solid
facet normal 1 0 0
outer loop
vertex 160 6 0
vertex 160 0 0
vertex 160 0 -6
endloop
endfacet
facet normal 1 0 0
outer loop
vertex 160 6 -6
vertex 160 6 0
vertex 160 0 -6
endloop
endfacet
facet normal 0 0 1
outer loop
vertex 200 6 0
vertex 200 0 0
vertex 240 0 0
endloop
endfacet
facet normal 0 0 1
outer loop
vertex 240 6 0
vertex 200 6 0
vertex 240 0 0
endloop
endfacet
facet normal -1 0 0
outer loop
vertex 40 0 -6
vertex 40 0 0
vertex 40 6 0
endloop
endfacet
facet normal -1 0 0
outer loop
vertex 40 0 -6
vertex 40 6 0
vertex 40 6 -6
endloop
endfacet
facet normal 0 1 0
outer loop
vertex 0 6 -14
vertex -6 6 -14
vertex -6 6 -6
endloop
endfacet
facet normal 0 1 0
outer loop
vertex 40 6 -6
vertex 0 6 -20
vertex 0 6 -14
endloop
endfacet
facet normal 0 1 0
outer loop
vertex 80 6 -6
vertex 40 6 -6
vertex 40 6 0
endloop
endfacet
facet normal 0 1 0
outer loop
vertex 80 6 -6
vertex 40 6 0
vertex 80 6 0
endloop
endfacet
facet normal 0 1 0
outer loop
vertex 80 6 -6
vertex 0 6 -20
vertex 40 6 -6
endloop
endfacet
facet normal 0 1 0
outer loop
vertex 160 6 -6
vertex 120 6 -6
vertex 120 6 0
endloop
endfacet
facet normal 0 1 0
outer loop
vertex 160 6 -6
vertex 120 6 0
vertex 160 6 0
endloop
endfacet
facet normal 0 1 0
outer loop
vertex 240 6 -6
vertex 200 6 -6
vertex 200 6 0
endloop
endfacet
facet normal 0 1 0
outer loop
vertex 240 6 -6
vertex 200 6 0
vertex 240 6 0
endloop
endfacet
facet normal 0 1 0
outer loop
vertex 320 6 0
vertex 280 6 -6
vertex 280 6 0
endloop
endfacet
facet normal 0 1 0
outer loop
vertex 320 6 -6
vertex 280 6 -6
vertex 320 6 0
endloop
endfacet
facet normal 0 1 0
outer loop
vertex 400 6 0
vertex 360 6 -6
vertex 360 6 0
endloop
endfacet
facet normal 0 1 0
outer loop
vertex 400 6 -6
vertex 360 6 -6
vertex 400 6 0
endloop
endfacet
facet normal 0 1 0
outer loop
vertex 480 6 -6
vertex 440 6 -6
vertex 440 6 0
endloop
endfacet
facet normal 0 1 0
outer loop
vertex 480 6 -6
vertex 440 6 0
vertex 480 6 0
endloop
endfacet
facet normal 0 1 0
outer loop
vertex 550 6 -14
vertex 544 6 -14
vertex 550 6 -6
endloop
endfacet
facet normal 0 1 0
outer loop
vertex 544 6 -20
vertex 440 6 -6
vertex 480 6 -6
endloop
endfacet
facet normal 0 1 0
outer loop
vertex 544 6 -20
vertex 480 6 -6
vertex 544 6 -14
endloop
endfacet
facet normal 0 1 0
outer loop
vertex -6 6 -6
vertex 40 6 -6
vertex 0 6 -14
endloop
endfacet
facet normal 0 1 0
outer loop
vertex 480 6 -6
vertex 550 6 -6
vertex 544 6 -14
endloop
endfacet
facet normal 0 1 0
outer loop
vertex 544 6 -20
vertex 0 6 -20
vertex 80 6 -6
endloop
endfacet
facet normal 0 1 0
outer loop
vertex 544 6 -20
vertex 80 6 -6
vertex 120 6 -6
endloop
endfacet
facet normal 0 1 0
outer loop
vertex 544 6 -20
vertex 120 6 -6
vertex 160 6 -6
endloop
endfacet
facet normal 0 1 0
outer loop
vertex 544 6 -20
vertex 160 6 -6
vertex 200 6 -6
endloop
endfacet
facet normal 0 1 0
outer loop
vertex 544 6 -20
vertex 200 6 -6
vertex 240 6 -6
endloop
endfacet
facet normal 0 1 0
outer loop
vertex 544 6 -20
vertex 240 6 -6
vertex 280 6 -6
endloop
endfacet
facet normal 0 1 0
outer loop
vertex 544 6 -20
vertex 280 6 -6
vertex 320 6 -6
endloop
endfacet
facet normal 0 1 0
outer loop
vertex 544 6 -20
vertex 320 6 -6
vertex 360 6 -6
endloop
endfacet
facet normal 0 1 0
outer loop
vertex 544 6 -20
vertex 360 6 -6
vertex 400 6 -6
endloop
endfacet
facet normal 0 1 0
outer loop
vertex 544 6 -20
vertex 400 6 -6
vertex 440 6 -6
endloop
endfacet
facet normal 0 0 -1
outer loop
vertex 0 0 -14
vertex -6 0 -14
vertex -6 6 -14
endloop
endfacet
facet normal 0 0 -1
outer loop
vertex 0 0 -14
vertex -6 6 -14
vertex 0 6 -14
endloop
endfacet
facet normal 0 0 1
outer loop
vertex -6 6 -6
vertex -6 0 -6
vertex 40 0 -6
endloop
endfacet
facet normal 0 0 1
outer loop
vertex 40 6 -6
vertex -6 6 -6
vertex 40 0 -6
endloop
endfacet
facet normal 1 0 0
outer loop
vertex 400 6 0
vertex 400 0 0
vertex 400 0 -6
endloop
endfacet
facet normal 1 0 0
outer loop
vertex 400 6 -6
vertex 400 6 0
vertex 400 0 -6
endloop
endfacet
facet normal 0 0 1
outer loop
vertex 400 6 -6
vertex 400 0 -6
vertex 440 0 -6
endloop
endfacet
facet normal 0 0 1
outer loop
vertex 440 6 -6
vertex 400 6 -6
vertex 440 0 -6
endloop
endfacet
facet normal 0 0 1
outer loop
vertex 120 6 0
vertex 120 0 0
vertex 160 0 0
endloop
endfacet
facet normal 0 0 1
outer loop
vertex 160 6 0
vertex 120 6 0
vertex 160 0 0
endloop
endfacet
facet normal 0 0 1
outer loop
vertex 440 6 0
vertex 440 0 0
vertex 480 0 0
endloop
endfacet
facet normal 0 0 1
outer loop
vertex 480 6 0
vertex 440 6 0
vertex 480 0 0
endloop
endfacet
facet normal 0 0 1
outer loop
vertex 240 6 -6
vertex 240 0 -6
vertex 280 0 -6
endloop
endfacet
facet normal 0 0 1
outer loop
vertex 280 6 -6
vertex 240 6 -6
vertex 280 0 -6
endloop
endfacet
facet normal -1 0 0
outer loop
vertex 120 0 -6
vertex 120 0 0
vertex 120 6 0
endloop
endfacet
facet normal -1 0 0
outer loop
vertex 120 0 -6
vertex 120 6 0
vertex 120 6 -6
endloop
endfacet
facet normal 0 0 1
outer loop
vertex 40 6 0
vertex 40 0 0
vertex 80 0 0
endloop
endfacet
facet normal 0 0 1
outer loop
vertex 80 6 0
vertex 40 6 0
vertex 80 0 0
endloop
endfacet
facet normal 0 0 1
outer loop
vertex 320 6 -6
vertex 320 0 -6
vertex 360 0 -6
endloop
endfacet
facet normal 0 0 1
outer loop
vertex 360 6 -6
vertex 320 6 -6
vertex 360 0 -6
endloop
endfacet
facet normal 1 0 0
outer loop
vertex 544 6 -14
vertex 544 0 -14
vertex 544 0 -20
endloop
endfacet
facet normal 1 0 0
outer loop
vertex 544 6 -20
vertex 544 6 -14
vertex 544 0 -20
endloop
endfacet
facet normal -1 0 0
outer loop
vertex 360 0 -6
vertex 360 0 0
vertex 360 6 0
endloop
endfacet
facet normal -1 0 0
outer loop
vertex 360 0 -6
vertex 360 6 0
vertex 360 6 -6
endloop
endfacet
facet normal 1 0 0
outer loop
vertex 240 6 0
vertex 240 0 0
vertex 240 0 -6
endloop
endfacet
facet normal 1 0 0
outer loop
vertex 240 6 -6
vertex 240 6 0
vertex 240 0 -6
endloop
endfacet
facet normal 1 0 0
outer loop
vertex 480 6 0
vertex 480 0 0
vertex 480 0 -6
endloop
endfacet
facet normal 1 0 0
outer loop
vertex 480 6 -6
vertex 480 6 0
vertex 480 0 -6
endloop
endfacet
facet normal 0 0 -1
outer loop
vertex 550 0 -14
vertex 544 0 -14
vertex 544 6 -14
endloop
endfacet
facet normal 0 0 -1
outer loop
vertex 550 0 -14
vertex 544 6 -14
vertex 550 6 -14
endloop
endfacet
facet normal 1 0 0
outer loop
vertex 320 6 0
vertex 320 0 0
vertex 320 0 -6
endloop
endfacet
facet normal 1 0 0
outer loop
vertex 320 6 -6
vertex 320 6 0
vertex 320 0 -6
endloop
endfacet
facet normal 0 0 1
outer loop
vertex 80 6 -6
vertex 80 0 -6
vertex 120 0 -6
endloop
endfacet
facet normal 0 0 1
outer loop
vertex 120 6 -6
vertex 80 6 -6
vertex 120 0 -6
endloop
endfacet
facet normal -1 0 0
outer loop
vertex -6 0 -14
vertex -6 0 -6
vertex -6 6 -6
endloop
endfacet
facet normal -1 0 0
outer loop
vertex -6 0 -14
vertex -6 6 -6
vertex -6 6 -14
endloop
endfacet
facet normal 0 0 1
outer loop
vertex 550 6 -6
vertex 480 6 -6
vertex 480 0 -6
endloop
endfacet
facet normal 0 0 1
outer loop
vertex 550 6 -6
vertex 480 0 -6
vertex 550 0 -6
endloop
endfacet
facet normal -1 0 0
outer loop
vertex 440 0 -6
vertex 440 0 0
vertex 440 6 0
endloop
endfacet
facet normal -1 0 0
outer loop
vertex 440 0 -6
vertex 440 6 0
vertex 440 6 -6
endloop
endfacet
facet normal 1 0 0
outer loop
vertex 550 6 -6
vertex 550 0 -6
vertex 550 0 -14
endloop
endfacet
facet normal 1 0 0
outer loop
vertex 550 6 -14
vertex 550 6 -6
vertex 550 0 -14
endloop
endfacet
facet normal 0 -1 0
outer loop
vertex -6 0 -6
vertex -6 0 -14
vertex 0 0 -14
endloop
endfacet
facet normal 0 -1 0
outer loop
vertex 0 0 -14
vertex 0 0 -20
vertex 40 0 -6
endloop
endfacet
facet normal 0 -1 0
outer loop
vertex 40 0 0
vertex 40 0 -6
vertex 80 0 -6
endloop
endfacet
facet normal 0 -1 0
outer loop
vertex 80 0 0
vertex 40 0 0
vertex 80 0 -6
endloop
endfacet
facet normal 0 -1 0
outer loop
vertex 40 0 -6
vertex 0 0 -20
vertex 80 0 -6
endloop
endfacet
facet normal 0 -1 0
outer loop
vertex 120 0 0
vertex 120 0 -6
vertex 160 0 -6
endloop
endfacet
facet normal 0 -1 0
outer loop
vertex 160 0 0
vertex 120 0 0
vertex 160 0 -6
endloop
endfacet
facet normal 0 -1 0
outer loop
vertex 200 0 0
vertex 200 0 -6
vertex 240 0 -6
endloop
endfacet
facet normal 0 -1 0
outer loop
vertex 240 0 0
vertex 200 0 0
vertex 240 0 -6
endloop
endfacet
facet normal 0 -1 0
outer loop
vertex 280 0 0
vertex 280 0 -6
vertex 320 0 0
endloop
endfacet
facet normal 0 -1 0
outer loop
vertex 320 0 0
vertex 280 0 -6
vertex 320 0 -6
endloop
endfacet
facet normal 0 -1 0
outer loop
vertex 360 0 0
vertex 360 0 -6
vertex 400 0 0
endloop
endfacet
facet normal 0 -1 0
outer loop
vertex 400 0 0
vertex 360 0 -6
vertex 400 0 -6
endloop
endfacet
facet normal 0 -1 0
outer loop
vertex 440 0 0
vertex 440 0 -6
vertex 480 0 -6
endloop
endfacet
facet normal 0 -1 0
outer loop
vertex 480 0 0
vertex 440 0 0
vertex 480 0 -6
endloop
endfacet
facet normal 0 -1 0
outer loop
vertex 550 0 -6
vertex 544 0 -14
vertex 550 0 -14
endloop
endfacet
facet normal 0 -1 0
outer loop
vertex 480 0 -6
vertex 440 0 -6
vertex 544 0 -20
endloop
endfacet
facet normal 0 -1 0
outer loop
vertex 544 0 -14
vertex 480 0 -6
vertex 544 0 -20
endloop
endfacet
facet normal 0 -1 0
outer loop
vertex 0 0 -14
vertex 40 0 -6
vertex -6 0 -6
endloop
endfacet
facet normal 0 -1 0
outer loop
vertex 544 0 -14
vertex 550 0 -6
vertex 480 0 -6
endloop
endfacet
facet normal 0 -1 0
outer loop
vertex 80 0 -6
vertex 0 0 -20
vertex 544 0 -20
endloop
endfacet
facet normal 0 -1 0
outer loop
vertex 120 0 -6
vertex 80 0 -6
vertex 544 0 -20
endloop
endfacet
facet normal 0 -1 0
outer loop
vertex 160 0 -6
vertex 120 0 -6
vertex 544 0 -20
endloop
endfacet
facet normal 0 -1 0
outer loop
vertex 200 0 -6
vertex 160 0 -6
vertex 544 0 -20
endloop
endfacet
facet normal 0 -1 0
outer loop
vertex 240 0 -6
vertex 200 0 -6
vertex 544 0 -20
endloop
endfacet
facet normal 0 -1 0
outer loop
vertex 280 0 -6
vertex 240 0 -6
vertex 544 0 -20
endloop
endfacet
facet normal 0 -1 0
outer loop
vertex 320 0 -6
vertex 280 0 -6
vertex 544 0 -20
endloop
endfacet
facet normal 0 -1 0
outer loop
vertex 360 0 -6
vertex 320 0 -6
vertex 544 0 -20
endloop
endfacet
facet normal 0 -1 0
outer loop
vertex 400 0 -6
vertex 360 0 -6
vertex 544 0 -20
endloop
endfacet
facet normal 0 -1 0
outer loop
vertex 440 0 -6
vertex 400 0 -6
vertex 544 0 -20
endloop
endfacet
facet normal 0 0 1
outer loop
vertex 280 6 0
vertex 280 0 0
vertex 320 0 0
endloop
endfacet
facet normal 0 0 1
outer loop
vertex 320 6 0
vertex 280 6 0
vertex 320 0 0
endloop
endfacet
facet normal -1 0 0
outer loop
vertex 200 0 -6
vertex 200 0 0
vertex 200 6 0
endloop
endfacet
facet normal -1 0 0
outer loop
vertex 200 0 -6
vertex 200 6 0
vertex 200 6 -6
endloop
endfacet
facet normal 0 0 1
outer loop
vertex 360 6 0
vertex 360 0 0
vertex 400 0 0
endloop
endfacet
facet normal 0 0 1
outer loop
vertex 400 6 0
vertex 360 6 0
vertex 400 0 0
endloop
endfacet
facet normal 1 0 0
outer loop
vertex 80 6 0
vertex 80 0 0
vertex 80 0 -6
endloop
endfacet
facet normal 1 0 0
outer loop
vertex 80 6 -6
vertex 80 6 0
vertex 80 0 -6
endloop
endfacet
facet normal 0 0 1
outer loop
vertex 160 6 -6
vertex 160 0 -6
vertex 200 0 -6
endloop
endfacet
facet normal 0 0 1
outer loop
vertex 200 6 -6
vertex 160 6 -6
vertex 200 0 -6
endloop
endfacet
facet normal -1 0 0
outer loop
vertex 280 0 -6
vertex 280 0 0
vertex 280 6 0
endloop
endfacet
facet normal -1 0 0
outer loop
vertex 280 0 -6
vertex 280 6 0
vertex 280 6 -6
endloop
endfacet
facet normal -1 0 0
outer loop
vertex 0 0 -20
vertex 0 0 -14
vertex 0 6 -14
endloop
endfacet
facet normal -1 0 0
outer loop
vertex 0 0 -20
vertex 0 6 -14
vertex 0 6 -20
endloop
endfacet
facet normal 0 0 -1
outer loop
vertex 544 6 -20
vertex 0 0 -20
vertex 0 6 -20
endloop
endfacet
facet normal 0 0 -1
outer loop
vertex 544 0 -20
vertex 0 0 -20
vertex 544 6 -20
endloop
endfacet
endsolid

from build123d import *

# Parameters (mm, degrees)
CROQUIS1_W              = 544
CROQUIS1_H              = 20
SALIENTE_EXTRUIR1_DEPTH = 6
CROQUIS3_W              = 40
CROQUIS3_H              = 6
CORTAR_EXTRUIR1_DEPTH   = 6
MATRIZL1_COUNT          = 7
MATRIZL1_PITCH          = 80
CROQUIS4_W              = 24
CROQUIS4_H              = 6
CORTAR_EXTRUIR2_DEPTH   = 6
CROQUIS5_W              = 6
CROQUIS5_H              = 8
SALIENTE_EXTRUIR3_DEPTH = 6


with BuildPart() as part:
    # Croquis1 → Saliente-Extruir1 (new body)
    with BuildSketch(Plane(origin=(0, 0, 0), x_dir=(1, 0, 0), z_dir=(0, 1, 0))):
        with Locations((272, 10)):
            Rectangle(CROQUIS1_W, CROQUIS1_H)
    extrude(amount=SALIENTE_EXTRUIR1_DEPTH)

    # Croquis3 → Cortar-Extruir1 (cut)
    with BuildSketch(Plane(origin=(0, 0, 0), x_dir=(1, 0, 0), z_dir=(0, 1, 0))):
        with Locations((20, 3)):
            Rectangle(CROQUIS3_W, CROQUIS3_H)
    cortar_extruir1 = extrude(amount=CORTAR_EXTRUIR1_DEPTH, mode=Mode.SUBTRACT)

    # MatrizL1: Cortar-Extruir1 ×7
    with Locations(*[(i * MATRIZL1_PITCH, 0, 0) for i in range(1, MATRIZL1_COUNT)]):
        add(cortar_extruir1, mode=Mode.SUBTRACT)

    # Croquis4 → Cortar-Extruir2 (cut)
    with BuildSketch(Plane(origin=(0, 6, 0), x_dir=(1, 0, 0), z_dir=(0, 1, 0))):
        with Locations((532, 3)):
            Rectangle(CROQUIS4_W, CROQUIS4_H)
    extrude(amount=-CORTAR_EXTRUIR2_DEPTH, mode=Mode.SUBTRACT)

    # Croquis5 → Saliente-Extruir3 (add)
    with BuildSketch(Plane(origin=(0, 0, 0), x_dir=(1, 0, 0), z_dir=(0, 1, 0))):
        with Locations((-3, 10)):
            Rectangle(CROQUIS5_W, CROQUIS5_H)
        with Locations((547, 10)):
            Rectangle(CROQUIS5_W, CROQUIS5_H)
    extrude(amount=SALIENTE_EXTRUIR3_DEPTH)


solid = part.part
